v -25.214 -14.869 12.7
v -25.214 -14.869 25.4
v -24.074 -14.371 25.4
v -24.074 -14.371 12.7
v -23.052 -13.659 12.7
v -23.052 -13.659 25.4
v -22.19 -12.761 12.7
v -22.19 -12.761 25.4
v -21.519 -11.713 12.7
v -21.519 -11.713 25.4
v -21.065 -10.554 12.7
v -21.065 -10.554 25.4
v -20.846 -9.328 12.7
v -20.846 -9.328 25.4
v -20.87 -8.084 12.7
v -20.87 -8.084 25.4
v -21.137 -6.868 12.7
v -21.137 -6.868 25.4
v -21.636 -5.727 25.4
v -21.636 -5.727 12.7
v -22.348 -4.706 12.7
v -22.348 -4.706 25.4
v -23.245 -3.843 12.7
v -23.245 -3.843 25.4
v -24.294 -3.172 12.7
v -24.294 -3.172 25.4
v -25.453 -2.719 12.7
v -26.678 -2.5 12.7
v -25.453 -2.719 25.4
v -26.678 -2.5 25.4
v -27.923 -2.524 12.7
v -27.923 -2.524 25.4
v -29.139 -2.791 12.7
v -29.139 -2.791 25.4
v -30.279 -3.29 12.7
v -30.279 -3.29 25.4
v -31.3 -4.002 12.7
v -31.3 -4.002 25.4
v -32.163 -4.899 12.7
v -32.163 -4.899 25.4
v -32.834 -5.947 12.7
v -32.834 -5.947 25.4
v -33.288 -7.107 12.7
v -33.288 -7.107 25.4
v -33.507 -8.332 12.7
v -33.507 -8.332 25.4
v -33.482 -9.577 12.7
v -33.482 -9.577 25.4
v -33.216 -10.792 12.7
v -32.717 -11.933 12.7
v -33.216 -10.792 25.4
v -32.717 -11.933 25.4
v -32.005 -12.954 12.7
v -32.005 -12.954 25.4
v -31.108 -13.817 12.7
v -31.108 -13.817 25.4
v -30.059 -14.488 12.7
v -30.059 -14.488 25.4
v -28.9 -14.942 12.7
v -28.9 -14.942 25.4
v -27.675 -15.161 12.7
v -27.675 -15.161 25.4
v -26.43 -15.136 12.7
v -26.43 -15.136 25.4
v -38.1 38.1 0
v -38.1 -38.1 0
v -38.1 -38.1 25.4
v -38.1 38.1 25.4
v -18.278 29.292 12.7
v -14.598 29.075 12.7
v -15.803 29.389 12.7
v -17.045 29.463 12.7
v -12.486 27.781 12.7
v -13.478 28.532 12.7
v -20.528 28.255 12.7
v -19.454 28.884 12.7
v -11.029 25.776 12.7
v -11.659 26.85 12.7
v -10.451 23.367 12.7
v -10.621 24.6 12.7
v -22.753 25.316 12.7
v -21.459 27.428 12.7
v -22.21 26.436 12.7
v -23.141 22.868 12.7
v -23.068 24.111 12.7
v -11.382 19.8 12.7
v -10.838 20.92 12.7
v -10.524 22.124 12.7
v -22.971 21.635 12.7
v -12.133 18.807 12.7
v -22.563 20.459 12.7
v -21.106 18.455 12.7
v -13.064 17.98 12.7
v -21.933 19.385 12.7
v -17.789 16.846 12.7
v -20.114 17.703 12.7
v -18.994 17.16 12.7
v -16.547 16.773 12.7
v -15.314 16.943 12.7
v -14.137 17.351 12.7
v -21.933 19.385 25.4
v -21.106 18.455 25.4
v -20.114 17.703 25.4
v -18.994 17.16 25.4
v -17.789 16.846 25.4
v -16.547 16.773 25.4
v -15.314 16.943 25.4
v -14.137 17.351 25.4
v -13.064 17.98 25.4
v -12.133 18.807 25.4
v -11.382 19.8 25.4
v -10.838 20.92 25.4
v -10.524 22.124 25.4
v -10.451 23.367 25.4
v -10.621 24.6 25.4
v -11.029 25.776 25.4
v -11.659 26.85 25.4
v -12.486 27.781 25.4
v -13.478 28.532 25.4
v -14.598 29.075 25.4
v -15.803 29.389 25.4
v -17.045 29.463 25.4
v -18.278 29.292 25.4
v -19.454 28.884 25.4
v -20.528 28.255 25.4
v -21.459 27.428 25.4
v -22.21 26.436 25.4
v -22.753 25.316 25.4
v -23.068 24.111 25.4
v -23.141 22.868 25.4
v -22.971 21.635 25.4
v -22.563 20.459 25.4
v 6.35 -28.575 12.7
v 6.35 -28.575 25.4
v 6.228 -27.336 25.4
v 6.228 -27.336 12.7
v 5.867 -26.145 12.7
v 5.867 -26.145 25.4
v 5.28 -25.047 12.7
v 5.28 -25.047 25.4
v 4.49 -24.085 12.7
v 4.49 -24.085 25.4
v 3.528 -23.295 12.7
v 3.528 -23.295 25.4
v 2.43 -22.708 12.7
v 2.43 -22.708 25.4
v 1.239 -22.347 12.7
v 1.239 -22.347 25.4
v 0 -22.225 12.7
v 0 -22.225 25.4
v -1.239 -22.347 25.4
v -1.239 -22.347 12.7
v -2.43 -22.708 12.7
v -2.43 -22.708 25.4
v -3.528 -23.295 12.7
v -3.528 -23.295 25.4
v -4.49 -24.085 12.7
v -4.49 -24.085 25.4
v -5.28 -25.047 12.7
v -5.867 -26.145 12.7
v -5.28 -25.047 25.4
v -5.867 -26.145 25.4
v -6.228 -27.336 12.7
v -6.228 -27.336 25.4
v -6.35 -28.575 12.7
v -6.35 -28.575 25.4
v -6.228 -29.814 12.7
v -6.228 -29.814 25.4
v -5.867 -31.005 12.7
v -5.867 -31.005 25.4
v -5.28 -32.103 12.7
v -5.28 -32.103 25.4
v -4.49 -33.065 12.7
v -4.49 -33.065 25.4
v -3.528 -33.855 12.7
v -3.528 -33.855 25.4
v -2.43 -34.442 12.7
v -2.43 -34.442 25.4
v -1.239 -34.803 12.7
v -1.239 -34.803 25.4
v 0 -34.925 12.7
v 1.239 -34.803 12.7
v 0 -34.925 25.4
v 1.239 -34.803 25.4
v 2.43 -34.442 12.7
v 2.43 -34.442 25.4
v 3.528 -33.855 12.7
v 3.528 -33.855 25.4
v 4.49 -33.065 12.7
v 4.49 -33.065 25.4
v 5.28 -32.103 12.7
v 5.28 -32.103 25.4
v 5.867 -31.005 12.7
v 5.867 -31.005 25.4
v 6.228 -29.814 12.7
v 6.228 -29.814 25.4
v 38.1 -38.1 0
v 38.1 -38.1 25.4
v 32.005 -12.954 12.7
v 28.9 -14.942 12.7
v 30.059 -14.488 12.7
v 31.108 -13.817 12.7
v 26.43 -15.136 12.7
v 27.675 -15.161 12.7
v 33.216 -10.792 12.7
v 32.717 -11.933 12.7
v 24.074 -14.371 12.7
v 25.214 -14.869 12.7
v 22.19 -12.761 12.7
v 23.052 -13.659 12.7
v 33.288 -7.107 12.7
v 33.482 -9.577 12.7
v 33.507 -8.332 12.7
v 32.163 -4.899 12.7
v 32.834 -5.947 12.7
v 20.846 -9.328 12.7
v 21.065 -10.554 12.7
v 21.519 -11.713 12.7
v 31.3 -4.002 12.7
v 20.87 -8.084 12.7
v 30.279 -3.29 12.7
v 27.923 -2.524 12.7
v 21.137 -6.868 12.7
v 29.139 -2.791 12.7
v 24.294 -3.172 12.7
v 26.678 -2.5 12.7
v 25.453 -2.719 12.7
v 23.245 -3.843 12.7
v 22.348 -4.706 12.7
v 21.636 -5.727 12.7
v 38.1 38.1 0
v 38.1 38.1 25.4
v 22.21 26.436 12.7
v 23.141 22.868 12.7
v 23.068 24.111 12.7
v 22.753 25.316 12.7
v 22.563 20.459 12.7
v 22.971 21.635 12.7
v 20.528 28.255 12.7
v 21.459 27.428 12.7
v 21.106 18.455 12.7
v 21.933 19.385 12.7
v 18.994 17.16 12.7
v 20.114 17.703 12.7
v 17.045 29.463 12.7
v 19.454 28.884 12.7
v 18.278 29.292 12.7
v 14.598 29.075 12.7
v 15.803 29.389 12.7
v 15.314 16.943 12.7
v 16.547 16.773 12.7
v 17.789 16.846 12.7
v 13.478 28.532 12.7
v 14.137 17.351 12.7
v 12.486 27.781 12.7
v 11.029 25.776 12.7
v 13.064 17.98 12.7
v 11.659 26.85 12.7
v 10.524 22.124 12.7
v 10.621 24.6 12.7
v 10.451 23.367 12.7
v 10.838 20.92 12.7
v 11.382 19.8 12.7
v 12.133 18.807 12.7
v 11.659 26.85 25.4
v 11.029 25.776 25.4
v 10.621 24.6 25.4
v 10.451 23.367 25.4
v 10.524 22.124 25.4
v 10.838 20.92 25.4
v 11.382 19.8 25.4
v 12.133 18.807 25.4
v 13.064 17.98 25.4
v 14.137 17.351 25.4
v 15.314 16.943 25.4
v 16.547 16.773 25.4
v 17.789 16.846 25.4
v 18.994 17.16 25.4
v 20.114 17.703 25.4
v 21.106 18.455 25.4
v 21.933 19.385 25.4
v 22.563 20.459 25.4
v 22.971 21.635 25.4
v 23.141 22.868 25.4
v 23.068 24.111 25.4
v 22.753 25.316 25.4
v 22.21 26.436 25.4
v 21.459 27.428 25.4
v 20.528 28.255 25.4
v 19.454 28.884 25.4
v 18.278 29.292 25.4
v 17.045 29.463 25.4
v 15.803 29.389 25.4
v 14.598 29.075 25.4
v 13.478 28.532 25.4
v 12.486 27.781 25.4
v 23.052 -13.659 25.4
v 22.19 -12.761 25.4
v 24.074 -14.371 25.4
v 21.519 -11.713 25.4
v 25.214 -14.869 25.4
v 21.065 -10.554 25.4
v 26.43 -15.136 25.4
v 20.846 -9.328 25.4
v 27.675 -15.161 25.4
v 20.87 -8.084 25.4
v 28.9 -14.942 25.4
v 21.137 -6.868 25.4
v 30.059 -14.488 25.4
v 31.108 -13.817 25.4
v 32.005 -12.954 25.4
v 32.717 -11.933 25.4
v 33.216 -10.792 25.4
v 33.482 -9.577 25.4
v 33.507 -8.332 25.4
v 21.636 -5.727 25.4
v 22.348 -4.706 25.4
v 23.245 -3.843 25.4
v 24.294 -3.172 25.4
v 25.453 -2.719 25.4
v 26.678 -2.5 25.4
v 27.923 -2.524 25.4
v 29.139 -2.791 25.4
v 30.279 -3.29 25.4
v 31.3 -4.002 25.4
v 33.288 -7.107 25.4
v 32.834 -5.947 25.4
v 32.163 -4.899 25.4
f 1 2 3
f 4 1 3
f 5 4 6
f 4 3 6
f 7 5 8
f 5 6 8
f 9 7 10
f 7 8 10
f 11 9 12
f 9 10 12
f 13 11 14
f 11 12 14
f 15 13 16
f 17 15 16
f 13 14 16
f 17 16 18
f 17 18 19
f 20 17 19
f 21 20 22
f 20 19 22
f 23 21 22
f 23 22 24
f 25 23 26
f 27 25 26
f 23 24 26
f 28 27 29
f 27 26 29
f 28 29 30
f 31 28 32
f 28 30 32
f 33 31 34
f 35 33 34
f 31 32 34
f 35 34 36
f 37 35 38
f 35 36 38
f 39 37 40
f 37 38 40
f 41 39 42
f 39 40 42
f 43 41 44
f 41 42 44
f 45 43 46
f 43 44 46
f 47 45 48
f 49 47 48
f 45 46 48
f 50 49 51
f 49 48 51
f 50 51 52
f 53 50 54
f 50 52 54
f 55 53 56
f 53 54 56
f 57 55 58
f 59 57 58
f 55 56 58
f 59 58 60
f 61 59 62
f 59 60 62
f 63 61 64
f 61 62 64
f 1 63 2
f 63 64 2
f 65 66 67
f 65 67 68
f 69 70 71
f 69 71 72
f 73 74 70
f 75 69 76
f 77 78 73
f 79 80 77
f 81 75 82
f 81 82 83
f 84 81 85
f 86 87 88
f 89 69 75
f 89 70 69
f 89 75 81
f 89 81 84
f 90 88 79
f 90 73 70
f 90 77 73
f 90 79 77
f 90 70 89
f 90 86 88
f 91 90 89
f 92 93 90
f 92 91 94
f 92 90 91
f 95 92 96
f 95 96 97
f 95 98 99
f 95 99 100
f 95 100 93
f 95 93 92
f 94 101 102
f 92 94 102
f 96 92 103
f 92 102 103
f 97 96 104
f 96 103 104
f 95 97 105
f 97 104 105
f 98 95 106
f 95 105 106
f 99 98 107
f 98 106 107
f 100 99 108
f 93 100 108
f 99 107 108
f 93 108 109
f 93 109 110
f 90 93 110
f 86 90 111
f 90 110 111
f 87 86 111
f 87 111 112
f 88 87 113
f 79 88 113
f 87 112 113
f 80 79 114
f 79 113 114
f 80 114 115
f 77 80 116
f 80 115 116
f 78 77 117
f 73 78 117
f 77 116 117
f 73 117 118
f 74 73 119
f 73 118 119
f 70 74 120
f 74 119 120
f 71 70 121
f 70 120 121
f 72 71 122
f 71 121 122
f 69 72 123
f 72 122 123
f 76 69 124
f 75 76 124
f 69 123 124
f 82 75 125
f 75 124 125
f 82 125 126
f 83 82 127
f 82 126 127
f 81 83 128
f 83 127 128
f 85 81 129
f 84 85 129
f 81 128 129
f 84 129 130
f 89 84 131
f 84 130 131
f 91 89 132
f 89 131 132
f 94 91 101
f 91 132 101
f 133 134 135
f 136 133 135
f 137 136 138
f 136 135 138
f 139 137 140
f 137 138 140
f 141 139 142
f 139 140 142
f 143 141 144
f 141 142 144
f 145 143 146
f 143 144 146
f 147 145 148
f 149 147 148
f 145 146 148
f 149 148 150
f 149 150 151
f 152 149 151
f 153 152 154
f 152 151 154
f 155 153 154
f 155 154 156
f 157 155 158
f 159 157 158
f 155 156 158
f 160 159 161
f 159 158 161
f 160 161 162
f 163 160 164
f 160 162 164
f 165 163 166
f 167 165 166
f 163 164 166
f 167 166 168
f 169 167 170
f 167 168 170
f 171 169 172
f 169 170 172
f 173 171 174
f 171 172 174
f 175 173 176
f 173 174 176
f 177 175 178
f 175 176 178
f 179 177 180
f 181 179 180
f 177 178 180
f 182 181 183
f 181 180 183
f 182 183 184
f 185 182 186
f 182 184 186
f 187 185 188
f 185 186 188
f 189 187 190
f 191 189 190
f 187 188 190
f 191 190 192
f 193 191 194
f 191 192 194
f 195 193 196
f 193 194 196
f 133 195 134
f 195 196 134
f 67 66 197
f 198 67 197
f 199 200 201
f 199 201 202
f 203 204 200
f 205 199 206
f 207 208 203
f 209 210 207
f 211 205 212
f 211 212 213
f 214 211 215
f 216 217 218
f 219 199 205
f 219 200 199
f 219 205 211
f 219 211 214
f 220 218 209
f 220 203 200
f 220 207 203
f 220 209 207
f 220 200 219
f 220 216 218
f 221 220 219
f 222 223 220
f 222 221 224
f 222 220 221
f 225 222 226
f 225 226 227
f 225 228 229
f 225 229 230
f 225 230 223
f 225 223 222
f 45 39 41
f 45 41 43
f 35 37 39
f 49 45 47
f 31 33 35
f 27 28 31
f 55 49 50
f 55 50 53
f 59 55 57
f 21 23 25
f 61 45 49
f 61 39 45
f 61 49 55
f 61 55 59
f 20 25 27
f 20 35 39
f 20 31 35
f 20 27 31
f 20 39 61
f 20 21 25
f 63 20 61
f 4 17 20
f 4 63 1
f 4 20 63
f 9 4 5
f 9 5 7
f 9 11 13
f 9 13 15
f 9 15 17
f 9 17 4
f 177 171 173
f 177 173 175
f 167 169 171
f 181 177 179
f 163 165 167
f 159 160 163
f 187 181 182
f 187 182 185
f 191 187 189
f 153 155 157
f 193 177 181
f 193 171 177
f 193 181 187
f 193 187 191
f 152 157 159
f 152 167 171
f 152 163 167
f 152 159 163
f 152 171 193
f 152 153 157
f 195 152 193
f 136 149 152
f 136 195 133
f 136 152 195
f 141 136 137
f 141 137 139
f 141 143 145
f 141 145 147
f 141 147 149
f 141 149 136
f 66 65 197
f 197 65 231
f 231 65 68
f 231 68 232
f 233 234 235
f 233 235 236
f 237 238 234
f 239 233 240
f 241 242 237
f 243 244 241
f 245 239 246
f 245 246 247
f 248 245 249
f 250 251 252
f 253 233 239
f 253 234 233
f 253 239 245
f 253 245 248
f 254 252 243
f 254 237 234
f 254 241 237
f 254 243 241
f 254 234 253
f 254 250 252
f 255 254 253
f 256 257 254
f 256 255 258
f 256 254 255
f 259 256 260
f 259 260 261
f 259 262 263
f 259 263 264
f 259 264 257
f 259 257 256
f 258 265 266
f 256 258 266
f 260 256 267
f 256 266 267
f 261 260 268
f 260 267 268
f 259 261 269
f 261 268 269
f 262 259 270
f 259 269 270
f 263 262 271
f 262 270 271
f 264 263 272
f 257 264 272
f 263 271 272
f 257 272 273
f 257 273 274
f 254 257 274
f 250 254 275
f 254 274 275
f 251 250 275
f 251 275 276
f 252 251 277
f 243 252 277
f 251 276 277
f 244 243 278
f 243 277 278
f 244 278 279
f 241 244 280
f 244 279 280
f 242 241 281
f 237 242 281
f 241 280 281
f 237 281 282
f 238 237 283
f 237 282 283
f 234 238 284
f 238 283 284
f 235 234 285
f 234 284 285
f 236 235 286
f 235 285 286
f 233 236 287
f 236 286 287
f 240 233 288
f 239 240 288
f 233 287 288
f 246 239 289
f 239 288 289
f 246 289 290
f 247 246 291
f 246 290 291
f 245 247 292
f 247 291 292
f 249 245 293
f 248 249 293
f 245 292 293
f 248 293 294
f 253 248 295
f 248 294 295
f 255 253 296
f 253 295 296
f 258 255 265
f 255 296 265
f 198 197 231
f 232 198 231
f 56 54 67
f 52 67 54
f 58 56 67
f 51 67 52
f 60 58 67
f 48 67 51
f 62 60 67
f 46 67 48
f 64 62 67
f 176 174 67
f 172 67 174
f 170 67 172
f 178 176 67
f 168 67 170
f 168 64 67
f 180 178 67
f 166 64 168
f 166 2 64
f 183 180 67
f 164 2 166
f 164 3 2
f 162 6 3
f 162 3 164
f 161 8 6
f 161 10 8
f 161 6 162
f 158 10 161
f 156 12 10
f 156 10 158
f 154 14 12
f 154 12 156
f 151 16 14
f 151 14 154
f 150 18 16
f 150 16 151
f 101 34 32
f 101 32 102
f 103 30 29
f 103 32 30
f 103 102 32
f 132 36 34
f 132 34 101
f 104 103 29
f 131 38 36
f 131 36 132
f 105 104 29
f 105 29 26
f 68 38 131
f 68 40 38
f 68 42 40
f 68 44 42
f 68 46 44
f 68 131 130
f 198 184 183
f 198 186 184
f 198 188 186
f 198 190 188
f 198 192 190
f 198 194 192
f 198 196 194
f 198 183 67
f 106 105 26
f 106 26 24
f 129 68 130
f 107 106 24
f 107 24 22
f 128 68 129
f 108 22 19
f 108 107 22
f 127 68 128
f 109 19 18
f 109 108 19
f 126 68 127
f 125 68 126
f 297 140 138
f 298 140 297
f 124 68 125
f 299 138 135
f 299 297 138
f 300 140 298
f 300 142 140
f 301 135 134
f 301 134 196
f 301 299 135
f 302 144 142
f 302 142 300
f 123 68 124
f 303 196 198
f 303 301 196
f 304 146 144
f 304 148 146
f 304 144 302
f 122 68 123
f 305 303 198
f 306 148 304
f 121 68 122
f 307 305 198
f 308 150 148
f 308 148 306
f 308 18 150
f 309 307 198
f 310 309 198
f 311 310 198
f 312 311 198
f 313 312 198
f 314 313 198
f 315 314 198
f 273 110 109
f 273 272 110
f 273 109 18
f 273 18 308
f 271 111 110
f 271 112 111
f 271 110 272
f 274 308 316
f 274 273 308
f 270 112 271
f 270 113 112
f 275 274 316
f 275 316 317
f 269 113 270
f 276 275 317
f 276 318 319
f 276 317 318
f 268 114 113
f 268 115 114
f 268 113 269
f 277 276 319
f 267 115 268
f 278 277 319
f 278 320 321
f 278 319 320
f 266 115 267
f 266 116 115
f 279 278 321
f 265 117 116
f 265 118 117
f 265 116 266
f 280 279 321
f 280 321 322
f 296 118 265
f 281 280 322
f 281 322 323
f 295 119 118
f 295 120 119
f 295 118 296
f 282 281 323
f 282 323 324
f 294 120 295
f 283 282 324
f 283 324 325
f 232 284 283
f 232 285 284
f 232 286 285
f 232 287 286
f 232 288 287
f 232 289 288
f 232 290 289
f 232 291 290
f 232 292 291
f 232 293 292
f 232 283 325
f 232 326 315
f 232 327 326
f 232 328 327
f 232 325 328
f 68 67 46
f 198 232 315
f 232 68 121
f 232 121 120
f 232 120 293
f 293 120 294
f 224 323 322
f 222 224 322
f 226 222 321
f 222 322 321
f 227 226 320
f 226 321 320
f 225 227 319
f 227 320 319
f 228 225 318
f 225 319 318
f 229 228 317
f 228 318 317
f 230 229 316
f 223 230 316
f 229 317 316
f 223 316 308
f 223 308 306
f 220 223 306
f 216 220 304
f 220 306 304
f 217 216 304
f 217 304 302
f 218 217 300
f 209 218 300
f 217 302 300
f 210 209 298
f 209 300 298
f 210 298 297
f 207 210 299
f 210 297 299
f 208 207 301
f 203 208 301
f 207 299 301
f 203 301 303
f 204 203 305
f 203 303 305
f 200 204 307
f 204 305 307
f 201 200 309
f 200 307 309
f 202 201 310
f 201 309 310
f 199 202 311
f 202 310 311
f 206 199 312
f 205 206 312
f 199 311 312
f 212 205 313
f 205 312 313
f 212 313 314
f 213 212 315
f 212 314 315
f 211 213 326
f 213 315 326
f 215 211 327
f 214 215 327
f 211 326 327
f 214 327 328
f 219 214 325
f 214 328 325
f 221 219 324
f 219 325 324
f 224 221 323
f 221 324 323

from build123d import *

# Parameters (mm, degrees)
F0_W            = 76.2
F0_H            = 76.2
F1_DEPTH        = 25.4
F2_R            = 6.35
F3_DEPTH        = 12.7
F3_COPIES_COUNT = 5


# Not quite as in the source:
# - a pattern or mirror of a feature is missing from the dataset's text; its kind, count and spacing are read off the source's solid


with BuildPart() as f1:
    # F0 (on Top) → F1 (new body)
    with BuildSketch(Plane.XY):
        Rectangle(F0_W, F0_H)
    extrude(amount=F1_DEPTH)

    # F2 (on face) → F3 (cut)
    with BuildSketch(Plane.XY.offset(25.4)):
        with Locations((0, -28.575)):
            Circle(F2_R)
    f3 = extrude(amount=-F3_DEPTH, mode=Mode.SUBTRACT)

    # F3_copies: F3 ×5 about axis
    f3_copies_axis = Axis((0, 0, 0), (0, 0, 1))
    for i in range(1, F3_COPIES_COUNT):
        add(f3.rotate(f3_copies_axis, i * 360 / F3_COPIES_COUNT), mode=Mode.SUBTRACT)


solid = f1.part
